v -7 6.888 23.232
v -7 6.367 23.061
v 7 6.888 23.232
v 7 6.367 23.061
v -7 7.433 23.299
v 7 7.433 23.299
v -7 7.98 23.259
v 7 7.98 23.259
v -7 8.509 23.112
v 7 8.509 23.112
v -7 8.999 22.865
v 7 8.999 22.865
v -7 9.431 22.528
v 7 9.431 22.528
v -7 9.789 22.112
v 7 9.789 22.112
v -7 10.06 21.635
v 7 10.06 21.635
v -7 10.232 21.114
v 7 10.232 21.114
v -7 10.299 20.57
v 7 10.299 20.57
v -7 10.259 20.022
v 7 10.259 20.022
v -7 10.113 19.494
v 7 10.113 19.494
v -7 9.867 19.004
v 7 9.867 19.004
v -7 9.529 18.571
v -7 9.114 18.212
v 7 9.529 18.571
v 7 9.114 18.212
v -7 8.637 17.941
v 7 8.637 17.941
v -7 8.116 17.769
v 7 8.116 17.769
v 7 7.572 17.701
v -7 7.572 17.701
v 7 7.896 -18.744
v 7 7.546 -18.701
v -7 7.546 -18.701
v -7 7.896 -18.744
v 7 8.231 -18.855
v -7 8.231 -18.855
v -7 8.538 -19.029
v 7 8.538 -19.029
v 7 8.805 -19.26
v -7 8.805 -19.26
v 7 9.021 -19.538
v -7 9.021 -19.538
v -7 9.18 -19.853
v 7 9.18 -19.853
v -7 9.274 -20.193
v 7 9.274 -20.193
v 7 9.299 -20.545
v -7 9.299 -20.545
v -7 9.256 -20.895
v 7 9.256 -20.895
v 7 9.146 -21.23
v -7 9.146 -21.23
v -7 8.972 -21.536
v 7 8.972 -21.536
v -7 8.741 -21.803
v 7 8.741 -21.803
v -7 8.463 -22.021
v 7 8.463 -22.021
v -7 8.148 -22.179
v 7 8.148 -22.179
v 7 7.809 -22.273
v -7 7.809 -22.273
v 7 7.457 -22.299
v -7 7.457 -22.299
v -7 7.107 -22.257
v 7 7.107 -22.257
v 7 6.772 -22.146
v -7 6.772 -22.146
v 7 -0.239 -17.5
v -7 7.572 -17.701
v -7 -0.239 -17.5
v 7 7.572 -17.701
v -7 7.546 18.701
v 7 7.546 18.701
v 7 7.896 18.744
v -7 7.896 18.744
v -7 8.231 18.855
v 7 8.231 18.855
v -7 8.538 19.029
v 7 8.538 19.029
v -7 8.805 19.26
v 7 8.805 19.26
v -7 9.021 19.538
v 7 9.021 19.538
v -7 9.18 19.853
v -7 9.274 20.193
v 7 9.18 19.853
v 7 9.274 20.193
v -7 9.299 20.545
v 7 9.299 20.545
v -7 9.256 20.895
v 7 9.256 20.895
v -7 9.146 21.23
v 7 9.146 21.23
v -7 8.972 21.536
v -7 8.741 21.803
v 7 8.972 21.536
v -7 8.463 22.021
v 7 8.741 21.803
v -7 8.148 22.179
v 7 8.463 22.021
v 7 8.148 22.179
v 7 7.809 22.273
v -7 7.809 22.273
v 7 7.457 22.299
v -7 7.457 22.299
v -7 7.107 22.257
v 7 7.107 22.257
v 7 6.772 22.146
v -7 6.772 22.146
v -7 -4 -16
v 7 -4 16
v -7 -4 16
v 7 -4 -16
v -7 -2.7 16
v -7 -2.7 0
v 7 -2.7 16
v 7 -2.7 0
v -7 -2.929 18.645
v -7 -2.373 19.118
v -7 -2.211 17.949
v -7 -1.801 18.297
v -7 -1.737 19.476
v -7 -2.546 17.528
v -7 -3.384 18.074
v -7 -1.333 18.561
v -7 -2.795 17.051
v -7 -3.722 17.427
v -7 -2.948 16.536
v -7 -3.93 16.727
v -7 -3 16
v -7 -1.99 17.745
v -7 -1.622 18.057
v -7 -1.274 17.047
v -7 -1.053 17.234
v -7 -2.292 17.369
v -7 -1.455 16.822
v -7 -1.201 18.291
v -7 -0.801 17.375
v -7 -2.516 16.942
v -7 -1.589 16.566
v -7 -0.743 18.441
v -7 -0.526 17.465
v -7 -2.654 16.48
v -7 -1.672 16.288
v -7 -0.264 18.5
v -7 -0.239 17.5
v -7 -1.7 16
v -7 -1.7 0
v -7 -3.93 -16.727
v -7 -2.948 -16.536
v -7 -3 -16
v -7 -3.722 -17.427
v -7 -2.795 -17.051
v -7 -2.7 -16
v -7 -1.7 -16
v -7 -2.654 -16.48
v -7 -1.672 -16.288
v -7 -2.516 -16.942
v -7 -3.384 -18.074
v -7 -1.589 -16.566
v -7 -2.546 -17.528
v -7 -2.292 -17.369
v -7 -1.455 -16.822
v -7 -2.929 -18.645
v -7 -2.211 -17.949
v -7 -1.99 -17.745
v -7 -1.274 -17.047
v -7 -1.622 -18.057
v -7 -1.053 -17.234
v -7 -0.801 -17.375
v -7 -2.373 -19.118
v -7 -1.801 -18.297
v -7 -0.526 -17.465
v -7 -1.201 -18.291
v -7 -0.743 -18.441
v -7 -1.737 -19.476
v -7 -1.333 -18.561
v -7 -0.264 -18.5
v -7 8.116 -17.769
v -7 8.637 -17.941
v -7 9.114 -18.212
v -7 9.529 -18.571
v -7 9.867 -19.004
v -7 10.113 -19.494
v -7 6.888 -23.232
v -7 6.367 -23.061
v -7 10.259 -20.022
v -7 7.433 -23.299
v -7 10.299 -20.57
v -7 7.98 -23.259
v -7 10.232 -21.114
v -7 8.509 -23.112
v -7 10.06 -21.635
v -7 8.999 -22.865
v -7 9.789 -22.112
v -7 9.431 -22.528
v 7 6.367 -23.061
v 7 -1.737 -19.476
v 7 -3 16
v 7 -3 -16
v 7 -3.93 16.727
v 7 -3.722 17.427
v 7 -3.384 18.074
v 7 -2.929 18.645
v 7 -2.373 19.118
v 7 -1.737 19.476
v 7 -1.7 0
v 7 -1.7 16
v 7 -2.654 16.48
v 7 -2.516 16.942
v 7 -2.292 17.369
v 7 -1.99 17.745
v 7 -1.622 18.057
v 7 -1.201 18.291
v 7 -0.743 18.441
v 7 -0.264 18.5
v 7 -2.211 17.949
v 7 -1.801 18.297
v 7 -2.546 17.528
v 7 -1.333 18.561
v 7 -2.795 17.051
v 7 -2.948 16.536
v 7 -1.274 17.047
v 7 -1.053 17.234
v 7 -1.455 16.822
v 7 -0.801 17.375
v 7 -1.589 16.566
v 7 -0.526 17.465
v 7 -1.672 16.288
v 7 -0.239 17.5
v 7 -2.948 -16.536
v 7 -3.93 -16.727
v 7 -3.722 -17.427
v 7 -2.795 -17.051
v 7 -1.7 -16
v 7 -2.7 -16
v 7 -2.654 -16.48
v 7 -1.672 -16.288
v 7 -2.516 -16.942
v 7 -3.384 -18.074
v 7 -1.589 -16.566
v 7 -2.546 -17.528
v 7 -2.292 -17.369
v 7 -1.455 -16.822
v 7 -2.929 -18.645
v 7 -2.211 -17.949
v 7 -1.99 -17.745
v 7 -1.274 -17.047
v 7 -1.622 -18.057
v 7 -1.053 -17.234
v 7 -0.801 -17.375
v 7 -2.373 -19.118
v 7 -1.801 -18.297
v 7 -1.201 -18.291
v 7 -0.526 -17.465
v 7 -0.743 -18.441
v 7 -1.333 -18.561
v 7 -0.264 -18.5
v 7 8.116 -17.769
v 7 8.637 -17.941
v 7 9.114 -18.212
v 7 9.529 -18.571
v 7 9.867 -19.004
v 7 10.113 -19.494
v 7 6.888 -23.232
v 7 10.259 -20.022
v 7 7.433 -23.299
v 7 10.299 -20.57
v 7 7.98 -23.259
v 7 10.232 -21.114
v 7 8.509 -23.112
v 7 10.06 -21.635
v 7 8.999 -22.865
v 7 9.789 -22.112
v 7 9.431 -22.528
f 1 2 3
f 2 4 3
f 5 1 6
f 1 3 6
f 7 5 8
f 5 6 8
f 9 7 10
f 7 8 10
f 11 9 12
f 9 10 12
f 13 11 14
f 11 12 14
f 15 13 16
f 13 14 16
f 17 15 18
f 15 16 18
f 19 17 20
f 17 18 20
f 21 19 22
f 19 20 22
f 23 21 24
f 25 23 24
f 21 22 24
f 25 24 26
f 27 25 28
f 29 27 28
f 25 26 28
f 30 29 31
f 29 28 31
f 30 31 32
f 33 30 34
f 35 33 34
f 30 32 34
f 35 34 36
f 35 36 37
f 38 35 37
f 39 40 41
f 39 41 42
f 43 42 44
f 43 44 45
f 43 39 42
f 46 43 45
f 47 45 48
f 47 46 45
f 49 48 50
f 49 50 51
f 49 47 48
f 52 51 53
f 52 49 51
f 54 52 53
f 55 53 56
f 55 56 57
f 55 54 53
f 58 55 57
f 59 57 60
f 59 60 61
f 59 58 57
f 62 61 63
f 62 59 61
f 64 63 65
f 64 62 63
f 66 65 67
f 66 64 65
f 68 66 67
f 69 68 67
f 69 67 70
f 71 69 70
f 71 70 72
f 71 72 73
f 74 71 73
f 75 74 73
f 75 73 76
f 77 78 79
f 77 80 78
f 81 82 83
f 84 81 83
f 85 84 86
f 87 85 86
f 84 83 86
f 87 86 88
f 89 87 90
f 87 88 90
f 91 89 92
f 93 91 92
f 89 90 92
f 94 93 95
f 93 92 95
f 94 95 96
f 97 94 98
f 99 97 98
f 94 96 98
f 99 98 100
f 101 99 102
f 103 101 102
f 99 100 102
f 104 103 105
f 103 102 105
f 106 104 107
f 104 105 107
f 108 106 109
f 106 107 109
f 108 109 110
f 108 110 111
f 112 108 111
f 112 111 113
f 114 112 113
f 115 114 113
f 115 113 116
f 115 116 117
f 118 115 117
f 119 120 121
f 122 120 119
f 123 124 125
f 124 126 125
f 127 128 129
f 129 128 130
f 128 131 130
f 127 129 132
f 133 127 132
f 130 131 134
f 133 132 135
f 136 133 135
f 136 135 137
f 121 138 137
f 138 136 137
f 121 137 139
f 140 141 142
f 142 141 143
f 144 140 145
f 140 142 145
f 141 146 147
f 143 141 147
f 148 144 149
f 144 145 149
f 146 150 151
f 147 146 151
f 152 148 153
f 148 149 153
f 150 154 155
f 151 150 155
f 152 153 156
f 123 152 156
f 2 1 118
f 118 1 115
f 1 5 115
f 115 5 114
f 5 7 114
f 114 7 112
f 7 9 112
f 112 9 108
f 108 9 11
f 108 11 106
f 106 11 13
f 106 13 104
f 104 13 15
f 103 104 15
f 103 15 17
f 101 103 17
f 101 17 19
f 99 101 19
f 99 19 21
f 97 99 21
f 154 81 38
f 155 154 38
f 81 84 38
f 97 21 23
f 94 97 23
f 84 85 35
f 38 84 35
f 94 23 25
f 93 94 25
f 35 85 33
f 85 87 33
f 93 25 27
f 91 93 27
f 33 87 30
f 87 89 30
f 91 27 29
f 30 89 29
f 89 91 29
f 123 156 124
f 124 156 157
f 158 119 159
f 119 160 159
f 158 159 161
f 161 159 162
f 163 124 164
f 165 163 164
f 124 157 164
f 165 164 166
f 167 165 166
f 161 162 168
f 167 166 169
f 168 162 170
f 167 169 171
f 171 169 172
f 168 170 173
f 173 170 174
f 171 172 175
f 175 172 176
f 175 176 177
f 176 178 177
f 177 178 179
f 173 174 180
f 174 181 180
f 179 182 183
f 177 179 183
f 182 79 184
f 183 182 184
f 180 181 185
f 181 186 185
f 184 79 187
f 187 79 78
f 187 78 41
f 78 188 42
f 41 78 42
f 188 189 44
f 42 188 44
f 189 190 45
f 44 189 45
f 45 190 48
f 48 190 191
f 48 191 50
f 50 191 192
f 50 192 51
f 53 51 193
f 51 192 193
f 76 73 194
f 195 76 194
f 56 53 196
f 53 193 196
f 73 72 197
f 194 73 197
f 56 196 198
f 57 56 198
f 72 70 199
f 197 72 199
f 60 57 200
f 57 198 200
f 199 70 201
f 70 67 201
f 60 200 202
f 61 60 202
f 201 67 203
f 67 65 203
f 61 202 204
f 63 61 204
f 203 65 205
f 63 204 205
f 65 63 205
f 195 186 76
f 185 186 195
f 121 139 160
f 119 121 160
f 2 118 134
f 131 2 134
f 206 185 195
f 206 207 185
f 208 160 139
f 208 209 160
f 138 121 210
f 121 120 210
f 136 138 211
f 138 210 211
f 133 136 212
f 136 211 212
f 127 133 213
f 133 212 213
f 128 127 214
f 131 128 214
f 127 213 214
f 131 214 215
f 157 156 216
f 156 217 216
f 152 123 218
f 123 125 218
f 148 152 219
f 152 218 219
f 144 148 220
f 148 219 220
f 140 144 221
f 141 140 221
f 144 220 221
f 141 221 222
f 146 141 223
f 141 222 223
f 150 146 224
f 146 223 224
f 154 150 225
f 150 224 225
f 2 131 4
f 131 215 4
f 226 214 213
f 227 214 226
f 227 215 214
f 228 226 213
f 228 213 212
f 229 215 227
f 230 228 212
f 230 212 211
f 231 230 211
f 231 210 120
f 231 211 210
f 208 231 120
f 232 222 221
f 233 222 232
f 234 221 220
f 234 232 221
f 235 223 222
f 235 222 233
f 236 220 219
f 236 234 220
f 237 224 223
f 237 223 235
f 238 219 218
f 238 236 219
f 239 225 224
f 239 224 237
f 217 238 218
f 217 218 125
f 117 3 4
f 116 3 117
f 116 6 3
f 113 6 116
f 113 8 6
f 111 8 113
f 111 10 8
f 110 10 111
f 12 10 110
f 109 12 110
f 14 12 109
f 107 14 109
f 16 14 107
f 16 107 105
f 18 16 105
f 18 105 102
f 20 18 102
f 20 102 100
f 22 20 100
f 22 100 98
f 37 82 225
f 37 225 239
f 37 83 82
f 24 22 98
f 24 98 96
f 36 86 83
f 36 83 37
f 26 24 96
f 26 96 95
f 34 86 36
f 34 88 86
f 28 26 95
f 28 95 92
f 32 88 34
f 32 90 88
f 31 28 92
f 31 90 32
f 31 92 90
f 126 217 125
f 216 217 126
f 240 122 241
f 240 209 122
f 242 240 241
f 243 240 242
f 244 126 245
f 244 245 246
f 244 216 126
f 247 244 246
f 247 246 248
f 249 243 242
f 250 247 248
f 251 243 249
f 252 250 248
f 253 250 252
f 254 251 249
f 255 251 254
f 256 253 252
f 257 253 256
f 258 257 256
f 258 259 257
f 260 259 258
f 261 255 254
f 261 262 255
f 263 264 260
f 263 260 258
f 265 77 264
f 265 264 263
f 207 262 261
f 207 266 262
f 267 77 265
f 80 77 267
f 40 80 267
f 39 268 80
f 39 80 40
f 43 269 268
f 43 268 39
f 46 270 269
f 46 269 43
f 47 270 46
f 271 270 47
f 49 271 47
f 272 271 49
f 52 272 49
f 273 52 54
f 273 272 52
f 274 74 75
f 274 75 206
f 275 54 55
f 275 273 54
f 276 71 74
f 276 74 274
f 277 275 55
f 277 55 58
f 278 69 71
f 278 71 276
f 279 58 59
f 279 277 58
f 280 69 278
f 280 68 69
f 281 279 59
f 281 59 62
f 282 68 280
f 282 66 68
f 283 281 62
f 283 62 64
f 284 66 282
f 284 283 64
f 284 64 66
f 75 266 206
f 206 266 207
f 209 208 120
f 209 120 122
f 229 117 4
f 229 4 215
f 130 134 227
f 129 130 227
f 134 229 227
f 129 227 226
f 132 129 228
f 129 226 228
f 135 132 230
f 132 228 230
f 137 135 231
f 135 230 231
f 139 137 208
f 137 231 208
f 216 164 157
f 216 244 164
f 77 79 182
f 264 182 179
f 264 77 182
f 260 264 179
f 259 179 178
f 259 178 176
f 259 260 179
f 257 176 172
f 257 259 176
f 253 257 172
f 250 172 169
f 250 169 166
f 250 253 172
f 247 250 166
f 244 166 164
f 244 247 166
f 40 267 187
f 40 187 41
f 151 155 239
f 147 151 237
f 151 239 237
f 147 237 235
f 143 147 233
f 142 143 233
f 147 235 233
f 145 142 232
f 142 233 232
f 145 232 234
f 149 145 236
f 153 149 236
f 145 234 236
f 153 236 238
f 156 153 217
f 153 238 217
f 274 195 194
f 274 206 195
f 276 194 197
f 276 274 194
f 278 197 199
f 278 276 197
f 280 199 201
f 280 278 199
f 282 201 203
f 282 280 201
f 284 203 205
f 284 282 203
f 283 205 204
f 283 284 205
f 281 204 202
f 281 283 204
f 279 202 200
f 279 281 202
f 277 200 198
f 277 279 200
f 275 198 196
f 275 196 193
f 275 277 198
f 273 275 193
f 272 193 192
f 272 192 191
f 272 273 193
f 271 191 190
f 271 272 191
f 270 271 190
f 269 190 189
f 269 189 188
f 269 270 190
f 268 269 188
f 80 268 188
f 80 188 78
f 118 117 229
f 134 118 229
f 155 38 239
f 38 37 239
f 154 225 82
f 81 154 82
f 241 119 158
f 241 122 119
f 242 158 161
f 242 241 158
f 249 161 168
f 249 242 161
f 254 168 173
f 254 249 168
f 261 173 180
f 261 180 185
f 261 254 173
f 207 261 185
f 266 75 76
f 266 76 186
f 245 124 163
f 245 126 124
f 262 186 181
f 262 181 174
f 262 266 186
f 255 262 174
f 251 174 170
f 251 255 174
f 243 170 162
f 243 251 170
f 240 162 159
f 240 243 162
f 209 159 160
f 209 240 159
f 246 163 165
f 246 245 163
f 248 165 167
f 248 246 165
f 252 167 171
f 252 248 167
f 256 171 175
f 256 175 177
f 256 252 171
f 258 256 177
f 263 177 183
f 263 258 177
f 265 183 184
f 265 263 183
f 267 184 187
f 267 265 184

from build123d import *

# Parameters (mm, degrees)
BOSS_EXTRUDE1_DEPTH = 7


with BuildPart() as part:
    # Sketch1 → Boss-Extrude1 (new body, symmetric)
    with BuildSketch(Plane(origin=(0, 0, 0), x_dir=(0, 0, -1), z_dir=(1, 0, 0))):
        with BuildLine():
            Line((-22.14614181, 6.771839894), (-18.561151485, -1.33269977))
            ThreePointArc((-18.561151485, -1.33269977), (-17.528308744, -2.546439623), (-16.000496078, -3))
            Line((-16.000496078, -3), (0, -3))
            Line((0, -3), (0, -4))
            Line((0, -4), (-16.000496078, -4))
            ThreePointArc((-16.000496078, -4), (-18.073958177, -3.384453165), (-19.475674713, -1.737233163))
            Line((-19.475674713, -1.737233163), (-23.060665038, 6.367306501))
            ThreePointArc((-23.060665038, 6.367306501), (-21.114031535, 10.231842835), (-17.700926013, 7.572005665))
            Line((-17.700926013, 7.572005665), (-17.5, -0.238584995))
            ThreePointArc((-17.5, -0.238584995), (-17.047428938, -1.274222609), (-16.000495091, -1.700010532))
            Line((-16.000495091, -1.700010532), (0, -1.7))
            Line((0, -1.7), (0, -2.7))
            Line((0, -2.7), (-16.000494433, -2.700010532))
            ThreePointArc((-16.000494433, -2.700010532), (-17.745384177, -1.990363995), (-18.499669281, -0.264301304))
            Line((-18.499669281, -0.264301304), (-18.700595294, 7.546289356))
            ThreePointArc((-18.700595294, 7.546289356), (-20.894734558, 9.25618468), (-22.14614181, 6.771839894))
        make_face()
    boss_extrude1 = extrude(amount=BOSS_EXTRUDE1_DEPTH, both=True)

    # Mirror1: Boss-Extrude1 across plane
    add(boss_extrude1.mirror(Plane.XY))


solid = part.part
